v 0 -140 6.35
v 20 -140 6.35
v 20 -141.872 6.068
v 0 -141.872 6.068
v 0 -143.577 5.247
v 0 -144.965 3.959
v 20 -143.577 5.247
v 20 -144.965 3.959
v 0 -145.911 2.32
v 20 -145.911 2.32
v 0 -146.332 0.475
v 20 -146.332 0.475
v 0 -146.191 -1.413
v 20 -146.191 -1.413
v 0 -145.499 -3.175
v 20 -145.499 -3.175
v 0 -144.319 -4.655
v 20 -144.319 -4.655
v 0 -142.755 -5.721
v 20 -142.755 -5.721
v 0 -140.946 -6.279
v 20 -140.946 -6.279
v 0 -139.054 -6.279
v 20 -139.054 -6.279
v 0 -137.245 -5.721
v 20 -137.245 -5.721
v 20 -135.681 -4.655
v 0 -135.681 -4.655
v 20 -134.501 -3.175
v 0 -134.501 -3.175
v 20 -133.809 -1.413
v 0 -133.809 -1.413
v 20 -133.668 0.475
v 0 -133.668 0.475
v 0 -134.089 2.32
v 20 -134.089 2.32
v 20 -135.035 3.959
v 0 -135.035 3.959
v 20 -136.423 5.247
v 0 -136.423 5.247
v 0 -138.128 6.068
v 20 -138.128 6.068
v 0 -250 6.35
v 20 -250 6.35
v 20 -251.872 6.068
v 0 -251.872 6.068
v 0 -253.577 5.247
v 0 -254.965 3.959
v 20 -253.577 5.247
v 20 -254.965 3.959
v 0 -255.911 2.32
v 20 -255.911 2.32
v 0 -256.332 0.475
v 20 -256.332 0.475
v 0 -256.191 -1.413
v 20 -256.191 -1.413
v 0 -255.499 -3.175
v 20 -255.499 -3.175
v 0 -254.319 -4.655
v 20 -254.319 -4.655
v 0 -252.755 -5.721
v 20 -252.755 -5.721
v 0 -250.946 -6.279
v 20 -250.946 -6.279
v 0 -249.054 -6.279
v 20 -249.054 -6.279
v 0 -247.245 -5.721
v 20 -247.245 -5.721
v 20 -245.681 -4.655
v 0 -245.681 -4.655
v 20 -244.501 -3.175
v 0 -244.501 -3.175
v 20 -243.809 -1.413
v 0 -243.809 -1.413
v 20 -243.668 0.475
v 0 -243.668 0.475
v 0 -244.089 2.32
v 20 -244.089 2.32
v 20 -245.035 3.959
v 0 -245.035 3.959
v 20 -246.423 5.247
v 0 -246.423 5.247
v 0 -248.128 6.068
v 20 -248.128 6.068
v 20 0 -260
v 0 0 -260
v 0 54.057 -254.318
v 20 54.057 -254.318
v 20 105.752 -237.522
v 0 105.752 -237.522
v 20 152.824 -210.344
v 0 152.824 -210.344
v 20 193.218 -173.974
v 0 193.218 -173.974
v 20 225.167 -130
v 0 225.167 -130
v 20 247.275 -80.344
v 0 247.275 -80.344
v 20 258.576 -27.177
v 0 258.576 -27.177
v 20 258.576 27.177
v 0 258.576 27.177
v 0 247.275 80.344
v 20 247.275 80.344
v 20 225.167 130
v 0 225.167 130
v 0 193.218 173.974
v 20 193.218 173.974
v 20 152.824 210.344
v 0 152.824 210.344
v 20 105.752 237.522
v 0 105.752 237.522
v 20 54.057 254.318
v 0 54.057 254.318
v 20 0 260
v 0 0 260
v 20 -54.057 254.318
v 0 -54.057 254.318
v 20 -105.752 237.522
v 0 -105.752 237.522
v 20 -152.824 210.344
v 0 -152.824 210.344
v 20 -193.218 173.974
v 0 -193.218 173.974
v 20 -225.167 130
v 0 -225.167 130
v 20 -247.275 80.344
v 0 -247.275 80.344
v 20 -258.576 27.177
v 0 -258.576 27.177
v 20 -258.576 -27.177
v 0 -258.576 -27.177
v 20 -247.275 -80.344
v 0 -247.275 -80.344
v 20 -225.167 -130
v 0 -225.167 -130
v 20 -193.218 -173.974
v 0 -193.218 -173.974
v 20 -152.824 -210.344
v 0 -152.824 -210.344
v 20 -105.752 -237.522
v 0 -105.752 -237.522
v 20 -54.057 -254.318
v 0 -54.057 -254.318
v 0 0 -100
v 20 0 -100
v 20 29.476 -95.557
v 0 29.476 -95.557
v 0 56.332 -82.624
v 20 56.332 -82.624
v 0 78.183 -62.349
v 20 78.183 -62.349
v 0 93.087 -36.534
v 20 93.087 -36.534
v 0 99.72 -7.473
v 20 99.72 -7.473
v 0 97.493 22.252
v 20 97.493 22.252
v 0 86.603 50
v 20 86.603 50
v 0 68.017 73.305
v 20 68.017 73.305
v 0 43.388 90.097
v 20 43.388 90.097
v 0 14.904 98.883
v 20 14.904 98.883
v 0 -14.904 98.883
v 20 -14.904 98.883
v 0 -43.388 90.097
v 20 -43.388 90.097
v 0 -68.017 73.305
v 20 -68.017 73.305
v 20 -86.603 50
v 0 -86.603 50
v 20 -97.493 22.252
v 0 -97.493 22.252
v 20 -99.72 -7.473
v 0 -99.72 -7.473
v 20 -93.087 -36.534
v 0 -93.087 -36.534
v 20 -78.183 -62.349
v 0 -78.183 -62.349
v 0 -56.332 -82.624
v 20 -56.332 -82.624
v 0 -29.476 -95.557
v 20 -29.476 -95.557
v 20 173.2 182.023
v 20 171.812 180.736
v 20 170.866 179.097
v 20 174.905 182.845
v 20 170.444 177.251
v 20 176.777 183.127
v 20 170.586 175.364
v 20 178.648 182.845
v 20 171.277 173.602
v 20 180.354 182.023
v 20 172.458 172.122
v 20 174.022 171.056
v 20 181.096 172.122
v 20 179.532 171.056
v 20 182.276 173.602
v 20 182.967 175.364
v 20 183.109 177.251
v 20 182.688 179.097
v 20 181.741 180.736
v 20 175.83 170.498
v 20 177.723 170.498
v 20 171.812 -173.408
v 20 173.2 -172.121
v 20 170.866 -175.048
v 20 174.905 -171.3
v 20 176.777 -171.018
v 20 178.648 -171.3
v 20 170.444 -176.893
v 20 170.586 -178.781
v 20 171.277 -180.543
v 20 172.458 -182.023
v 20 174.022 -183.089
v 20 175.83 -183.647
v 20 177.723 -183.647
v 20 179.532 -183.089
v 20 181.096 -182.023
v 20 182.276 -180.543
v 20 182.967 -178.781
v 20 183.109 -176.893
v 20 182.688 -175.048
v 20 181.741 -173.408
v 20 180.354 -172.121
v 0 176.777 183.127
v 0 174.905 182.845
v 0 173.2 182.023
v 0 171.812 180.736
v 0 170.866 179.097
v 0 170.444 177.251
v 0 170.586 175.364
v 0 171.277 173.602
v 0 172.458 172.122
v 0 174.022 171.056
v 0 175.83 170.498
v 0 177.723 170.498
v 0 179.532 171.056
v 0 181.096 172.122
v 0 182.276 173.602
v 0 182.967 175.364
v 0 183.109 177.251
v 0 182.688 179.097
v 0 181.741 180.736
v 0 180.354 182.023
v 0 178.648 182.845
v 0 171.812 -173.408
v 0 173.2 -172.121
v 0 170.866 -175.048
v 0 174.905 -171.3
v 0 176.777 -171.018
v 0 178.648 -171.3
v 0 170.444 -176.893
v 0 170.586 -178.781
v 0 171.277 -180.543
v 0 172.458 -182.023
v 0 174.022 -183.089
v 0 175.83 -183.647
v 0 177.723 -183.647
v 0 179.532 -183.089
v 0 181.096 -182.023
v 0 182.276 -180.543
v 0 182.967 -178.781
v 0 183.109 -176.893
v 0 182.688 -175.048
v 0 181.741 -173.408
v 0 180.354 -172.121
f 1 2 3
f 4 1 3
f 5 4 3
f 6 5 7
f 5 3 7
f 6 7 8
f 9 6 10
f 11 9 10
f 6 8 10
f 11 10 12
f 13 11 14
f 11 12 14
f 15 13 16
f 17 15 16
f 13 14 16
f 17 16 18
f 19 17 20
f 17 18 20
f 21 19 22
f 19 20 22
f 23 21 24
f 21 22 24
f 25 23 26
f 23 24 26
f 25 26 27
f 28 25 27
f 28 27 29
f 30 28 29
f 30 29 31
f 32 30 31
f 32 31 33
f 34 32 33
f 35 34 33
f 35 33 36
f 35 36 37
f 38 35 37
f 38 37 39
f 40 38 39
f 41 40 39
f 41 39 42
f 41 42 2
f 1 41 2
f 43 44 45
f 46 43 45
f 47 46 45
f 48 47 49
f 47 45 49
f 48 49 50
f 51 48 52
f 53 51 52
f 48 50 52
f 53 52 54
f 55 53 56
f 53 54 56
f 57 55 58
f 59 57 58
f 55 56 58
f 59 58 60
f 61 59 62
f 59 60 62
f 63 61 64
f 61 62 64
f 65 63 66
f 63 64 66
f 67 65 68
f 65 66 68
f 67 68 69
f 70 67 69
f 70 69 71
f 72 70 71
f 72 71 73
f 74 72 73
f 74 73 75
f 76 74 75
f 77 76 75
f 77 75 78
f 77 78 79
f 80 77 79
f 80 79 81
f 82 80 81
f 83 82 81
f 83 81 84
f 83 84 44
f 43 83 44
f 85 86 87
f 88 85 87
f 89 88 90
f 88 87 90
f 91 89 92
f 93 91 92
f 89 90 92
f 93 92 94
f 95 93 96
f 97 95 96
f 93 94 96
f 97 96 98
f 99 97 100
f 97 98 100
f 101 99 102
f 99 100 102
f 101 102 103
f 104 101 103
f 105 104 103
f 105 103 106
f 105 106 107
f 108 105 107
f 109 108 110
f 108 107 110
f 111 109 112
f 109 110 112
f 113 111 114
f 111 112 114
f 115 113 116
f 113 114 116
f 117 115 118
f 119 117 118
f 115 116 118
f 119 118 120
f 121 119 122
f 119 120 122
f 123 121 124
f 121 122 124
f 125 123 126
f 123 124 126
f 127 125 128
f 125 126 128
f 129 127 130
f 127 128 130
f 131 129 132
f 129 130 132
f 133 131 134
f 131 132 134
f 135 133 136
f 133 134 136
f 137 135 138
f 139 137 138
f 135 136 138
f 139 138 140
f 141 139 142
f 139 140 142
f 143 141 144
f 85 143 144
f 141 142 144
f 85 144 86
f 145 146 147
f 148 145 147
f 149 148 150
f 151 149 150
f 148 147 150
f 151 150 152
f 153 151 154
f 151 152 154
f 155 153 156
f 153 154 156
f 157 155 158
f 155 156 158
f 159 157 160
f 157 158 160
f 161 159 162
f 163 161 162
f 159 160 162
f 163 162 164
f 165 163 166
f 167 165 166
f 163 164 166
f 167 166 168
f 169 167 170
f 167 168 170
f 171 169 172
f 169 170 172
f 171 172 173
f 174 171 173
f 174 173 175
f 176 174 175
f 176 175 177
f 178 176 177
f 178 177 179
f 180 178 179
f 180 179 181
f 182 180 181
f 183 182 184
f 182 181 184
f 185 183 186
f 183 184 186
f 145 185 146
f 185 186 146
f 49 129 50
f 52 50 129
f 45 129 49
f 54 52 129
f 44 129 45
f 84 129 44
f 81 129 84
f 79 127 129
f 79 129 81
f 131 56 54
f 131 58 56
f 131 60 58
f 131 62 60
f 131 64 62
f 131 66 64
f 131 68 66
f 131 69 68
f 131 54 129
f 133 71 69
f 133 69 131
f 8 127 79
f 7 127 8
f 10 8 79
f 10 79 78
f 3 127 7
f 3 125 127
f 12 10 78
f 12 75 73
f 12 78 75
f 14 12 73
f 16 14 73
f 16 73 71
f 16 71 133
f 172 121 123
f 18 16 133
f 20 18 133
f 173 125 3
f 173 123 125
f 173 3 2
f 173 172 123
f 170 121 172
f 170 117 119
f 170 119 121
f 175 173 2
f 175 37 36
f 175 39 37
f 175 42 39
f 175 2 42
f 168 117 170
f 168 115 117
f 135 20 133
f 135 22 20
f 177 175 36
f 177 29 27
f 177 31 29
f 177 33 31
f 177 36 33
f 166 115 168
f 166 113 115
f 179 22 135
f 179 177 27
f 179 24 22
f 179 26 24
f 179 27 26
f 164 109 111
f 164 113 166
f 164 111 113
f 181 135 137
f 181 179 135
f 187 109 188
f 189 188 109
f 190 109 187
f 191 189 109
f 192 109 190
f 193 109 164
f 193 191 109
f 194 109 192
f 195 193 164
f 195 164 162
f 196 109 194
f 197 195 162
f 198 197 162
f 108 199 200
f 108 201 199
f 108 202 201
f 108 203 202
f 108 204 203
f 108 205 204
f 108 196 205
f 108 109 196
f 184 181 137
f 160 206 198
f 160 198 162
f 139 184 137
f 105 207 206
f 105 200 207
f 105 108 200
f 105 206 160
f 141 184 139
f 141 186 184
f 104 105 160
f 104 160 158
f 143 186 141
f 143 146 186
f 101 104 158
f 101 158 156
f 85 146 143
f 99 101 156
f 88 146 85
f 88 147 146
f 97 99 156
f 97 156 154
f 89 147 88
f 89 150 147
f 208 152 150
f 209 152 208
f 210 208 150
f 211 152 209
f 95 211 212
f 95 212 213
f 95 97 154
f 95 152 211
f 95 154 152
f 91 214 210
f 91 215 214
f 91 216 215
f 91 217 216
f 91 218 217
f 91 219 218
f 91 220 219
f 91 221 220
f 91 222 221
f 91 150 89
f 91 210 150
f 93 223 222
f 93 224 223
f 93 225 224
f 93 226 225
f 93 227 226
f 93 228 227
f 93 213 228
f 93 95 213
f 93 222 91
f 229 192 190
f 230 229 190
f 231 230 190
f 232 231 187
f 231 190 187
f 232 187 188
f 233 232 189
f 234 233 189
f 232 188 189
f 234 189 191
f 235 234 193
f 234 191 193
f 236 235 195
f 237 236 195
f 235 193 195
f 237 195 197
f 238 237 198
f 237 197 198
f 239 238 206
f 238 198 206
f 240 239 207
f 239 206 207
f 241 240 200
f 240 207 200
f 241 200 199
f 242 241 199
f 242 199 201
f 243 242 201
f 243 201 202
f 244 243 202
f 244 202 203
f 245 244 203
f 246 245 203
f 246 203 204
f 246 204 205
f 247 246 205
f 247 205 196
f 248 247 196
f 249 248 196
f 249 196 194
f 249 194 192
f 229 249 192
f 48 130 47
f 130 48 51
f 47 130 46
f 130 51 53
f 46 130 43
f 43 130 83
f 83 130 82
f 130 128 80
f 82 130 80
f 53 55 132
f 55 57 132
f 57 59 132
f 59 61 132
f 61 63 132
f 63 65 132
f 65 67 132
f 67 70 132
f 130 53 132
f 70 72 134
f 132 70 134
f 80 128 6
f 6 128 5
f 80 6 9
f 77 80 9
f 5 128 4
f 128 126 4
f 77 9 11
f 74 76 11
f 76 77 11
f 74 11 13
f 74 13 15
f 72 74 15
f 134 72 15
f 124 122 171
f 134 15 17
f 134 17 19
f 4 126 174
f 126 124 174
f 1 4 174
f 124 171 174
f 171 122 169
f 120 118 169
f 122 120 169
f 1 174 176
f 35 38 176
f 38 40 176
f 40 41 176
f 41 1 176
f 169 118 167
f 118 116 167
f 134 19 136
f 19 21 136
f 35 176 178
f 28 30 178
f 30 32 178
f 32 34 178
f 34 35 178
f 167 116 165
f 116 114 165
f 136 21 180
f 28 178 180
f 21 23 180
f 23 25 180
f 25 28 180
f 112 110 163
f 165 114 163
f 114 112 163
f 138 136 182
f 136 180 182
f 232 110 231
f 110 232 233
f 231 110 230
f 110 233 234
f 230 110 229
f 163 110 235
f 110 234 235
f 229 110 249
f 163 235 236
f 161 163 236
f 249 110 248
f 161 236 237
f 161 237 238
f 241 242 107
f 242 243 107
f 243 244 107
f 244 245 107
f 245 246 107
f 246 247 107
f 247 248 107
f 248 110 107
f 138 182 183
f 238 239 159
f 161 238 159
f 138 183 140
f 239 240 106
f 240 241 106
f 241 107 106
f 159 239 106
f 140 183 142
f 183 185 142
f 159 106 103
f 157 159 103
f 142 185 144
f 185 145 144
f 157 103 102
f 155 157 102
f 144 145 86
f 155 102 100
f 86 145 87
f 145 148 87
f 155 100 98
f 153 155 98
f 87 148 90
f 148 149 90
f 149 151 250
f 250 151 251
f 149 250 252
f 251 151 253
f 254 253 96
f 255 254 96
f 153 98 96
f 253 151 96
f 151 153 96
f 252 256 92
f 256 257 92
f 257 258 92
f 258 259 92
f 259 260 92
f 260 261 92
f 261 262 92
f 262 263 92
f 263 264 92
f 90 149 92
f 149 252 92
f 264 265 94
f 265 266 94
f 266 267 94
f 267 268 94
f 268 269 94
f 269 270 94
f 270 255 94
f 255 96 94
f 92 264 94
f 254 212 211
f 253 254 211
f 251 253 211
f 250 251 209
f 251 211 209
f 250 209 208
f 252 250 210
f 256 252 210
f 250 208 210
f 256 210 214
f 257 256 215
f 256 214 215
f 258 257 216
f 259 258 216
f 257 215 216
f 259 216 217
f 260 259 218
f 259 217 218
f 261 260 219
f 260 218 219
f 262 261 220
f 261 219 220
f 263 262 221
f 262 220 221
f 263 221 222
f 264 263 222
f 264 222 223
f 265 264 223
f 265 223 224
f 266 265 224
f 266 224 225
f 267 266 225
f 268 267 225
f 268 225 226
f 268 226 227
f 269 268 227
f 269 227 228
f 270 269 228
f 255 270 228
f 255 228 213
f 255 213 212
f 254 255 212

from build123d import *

# Parameters (mm, degrees)
SKETCH1_R                         = 260
BOSS_EXTRUDE1_DEPTH               = 20
SKETCH2_R                         = 100
CUT_EXTRUDE1_DEPTH                = 20
F_1_2_13_TAPPED_HOLE1_D           = 10.71626
F_1_2_13_TAPPED_HOLE1_DEPTH       = 70.4
F_1_2_13_TAPPED_HOLE1_CBORE_D     = 12.7
F_1_2_13_TAPPED_HOLE1_CBORE_DEPTH = 64.5
F_1_2_13_TAPPED_HOLE1_TIP         = 3.219489309


with BuildPart() as part:
    # Sketch1 → Boss-Extrude1 (new body)
    with BuildSketch(Plane(origin=(0, 0, 0), x_dir=(0, 0, -1), z_dir=(1, 0, 0))):
        Circle(SKETCH1_R)
    extrude(amount=BOSS_EXTRUDE1_DEPTH)

    # Sketch2 → Cut-Extrude1 (cut)
    with BuildSketch(Plane(origin=(20, 0, 0), x_dir=(0, 0, -1), z_dir=(1, 0, 0))):
        Circle(SKETCH2_R)
    extrude(amount=-CUT_EXTRUDE1_DEPTH, mode=Mode.SUBTRACT)

    # 1/2-13 Tapped Hole1
    with Locations(Plane(origin=(20, 176.776695297, -177.367627121), x_dir=(0, 0, 1), z_dir=(1, 0, 0))):
        with Locations((0, 0), (354.144322418, 0), (177.367627121, 426.776695297), (177.367627121, 316.776695297)):
            CounterBoreHole(F_1_2_13_TAPPED_HOLE1_D / 2, F_1_2_13_TAPPED_HOLE1_CBORE_D / 2, F_1_2_13_TAPPED_HOLE1_CBORE_DEPTH, depth=F_1_2_13_TAPPED_HOLE1_DEPTH)
            with Locations((0, 0, -(F_1_2_13_TAPPED_HOLE1_DEPTH + F_1_2_13_TAPPED_HOLE1_TIP / 2))):  # 118° drill point
                Cone(0, F_1_2_13_TAPPED_HOLE1_D / 2, F_1_2_13_TAPPED_HOLE1_TIP, mode=Mode.SUBTRACT)


solid = part.part
